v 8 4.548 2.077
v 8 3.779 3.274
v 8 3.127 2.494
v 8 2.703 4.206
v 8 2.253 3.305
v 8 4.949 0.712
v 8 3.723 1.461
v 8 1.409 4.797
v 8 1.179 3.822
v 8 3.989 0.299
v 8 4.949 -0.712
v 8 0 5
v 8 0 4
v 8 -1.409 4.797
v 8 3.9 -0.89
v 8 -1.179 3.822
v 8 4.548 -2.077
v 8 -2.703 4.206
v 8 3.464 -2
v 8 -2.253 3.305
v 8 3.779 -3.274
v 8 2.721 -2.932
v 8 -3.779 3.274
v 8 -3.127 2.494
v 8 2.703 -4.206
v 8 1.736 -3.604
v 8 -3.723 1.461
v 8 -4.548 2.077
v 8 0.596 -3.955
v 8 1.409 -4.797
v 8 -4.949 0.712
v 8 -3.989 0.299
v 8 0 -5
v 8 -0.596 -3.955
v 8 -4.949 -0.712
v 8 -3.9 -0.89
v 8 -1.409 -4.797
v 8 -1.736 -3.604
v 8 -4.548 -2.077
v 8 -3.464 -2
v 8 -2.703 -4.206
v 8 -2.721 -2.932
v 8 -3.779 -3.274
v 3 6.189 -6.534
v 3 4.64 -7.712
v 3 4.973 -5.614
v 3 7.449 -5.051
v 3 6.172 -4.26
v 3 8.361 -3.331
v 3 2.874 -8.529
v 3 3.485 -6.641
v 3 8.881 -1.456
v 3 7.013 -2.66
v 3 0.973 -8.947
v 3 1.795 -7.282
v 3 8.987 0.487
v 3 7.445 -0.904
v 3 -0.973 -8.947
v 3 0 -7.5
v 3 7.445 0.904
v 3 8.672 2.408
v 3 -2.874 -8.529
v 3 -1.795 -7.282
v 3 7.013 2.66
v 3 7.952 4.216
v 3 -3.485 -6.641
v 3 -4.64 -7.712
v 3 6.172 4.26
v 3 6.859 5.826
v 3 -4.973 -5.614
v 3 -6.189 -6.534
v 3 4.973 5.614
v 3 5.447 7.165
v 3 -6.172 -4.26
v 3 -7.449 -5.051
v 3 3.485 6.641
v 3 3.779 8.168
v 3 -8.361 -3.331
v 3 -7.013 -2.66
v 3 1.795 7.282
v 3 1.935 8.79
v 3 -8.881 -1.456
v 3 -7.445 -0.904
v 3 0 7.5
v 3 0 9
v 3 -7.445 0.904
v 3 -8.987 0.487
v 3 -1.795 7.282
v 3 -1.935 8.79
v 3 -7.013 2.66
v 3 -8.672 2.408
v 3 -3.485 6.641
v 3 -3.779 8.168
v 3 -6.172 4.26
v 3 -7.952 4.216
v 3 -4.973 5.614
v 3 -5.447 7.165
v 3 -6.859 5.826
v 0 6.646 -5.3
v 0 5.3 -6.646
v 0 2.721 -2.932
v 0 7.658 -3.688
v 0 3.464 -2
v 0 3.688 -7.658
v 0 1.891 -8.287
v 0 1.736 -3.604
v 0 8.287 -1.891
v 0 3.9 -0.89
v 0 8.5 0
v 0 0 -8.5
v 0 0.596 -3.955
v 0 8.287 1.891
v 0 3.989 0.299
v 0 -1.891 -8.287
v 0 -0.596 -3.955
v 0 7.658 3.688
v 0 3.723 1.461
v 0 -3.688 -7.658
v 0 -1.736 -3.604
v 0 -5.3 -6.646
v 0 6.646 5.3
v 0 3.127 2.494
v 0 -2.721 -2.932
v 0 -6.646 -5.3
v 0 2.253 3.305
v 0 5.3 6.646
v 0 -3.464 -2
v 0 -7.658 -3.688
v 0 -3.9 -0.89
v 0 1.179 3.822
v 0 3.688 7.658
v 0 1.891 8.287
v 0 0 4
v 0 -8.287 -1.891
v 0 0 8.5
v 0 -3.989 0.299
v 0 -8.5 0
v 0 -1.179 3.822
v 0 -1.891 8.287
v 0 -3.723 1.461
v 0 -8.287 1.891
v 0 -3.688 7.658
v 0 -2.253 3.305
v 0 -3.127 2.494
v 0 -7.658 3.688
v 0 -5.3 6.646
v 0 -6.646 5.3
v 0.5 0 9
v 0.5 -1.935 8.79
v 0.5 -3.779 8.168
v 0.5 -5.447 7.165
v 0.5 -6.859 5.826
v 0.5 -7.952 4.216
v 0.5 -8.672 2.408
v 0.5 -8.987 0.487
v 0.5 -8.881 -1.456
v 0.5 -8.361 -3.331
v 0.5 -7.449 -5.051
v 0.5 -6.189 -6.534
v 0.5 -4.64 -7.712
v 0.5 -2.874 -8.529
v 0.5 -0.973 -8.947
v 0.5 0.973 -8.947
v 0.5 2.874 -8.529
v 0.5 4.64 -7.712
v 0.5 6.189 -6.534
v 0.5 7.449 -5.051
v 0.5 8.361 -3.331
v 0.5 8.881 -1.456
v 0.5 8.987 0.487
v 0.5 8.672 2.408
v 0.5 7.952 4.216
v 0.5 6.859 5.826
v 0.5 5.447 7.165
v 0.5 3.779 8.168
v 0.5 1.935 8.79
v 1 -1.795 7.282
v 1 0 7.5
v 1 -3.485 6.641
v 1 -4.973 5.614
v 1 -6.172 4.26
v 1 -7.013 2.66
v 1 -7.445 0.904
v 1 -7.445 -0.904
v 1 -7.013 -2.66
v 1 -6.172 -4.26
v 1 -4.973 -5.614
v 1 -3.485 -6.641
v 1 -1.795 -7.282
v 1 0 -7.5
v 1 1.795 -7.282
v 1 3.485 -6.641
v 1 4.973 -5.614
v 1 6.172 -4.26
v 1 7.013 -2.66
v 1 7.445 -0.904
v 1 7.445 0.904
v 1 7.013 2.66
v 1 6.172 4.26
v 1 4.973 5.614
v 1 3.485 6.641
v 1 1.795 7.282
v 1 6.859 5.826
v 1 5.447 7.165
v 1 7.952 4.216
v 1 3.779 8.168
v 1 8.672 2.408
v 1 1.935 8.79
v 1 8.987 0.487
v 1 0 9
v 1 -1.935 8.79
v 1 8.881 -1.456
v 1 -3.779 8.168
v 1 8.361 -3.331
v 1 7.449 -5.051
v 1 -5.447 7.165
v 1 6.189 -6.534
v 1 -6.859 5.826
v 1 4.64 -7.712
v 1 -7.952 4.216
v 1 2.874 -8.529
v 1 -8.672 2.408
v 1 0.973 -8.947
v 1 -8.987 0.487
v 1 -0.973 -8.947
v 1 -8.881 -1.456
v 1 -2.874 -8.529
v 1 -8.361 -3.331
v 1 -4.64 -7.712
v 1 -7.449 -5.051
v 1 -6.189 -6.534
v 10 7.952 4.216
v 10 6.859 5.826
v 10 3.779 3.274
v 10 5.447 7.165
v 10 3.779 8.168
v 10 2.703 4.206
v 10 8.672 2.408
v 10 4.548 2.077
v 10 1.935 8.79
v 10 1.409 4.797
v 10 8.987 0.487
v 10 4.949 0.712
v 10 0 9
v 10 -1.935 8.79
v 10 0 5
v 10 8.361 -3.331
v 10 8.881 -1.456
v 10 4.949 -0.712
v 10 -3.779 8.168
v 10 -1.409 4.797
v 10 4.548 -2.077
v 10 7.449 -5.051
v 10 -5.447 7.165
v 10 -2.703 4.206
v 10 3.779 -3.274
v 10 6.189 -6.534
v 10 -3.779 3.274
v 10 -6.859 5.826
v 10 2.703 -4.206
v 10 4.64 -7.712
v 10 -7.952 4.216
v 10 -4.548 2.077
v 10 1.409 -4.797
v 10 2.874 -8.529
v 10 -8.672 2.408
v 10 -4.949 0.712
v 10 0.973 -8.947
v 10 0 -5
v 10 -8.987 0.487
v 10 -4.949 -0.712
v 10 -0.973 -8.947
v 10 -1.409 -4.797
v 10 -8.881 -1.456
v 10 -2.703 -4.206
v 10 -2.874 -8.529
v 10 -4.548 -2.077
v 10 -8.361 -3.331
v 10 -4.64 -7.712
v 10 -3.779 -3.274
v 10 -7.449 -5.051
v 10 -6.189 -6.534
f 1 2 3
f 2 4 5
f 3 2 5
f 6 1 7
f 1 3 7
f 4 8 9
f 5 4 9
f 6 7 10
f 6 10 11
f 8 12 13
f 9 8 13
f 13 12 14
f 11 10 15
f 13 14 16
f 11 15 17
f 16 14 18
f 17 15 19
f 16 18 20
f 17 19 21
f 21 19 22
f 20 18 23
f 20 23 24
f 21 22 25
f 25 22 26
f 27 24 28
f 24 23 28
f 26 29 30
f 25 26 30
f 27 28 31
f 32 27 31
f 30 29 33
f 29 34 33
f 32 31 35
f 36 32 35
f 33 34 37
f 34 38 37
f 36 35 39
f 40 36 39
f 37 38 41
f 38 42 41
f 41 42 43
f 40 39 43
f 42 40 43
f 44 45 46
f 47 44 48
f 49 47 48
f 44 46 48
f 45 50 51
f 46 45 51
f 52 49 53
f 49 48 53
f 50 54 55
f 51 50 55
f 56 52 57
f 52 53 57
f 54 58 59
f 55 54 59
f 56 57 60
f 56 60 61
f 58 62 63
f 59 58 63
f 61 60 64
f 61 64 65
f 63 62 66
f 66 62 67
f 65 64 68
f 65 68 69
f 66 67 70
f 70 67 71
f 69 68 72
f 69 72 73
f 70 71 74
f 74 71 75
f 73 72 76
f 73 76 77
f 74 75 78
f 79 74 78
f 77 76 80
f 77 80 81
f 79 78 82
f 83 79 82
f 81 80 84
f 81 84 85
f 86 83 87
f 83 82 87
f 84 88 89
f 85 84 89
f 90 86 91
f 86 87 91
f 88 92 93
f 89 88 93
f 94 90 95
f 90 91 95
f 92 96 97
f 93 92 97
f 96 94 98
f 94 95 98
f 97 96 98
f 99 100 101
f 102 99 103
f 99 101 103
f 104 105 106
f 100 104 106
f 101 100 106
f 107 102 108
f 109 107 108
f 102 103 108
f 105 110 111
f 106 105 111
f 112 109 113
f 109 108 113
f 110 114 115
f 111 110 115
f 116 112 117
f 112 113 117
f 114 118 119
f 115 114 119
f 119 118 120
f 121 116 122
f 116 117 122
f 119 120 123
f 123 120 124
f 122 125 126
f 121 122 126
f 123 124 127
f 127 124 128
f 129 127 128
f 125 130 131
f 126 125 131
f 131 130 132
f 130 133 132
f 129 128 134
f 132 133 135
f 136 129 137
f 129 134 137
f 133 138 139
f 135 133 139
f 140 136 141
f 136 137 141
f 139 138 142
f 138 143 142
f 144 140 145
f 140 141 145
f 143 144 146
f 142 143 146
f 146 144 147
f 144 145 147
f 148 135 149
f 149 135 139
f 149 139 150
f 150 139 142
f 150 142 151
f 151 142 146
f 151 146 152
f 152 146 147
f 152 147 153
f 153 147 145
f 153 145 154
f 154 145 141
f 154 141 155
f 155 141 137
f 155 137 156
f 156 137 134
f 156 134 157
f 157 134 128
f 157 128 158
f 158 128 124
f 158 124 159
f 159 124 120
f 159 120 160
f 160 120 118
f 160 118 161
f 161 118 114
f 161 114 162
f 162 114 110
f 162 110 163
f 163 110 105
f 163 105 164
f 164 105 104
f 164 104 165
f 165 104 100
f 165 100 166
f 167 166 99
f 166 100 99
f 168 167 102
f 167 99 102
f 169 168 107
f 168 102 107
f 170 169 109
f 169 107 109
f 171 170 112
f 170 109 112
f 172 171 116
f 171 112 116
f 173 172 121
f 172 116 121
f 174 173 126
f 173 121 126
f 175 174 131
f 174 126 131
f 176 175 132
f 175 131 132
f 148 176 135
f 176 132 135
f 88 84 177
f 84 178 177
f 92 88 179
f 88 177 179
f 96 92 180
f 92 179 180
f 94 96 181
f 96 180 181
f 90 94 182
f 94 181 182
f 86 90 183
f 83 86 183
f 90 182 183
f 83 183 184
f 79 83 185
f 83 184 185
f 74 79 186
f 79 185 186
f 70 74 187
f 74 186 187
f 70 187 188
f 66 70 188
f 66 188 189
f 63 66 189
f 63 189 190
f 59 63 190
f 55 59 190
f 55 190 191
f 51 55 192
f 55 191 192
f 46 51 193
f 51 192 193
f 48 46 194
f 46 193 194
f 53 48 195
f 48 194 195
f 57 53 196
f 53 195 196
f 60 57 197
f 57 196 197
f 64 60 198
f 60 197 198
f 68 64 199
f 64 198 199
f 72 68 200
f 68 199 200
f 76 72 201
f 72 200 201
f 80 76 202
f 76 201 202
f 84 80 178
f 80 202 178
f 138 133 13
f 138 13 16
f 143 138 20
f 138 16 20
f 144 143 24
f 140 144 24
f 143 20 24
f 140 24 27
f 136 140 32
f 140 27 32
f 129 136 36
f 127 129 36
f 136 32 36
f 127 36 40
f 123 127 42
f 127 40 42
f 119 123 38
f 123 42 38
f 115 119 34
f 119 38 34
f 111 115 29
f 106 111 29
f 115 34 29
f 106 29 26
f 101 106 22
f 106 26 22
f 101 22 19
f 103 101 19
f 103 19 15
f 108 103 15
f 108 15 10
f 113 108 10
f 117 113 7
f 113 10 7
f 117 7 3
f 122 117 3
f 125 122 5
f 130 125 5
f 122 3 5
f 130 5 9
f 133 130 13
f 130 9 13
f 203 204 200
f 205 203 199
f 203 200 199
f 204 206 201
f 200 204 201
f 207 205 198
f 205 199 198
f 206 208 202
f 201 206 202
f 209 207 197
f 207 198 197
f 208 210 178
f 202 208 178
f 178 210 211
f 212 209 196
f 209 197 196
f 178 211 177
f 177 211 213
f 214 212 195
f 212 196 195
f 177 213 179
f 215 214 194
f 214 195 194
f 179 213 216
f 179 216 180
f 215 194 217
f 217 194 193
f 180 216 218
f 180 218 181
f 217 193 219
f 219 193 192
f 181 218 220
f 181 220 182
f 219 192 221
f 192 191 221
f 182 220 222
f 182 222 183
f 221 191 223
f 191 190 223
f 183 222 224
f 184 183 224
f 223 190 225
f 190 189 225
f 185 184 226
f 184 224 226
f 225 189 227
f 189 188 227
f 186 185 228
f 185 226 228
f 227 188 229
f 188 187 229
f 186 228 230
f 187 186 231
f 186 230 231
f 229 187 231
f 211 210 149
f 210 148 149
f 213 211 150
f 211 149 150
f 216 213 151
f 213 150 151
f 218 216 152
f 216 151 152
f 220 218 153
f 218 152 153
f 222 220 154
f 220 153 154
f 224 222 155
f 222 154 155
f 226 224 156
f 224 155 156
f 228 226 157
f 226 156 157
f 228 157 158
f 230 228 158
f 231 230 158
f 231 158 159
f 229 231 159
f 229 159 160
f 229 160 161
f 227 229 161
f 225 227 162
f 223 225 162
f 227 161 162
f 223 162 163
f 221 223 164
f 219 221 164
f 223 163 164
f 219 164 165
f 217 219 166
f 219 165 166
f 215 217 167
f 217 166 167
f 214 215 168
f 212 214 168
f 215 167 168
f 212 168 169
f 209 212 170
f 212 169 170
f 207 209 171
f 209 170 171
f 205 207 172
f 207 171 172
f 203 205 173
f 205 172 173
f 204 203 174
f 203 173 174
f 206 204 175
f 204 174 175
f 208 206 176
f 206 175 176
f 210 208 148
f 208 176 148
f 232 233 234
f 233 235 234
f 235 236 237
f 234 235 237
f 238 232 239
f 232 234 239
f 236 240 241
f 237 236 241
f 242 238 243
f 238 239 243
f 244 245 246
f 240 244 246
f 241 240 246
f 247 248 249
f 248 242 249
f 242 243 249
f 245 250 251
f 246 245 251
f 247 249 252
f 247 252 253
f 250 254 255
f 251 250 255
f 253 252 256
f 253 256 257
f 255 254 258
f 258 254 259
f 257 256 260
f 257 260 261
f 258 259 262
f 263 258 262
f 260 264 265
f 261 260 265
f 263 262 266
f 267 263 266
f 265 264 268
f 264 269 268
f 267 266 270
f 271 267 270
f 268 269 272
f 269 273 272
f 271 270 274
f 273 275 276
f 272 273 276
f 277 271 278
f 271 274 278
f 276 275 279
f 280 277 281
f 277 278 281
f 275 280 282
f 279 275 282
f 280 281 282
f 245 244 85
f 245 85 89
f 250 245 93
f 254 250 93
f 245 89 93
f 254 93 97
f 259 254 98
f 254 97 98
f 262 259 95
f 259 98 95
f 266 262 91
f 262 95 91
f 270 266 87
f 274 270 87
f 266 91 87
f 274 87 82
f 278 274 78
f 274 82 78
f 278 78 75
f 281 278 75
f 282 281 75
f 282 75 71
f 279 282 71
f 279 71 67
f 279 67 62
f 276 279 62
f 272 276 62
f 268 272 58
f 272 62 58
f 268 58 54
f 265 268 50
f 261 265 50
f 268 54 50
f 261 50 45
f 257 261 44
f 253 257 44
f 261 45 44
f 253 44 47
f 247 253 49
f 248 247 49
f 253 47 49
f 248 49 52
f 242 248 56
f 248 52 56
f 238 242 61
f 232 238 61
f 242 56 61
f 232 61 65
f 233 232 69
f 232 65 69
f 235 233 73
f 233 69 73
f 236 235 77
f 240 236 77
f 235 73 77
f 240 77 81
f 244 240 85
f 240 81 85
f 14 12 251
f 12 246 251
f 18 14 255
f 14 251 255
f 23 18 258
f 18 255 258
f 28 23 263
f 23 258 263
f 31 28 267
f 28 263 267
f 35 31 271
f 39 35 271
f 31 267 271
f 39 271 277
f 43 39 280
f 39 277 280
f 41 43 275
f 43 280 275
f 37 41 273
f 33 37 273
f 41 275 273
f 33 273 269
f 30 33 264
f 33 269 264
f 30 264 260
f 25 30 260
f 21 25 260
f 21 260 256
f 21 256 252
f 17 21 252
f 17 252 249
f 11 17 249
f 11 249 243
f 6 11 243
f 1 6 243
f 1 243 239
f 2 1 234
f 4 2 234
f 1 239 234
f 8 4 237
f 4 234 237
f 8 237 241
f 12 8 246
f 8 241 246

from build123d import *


with BuildPart() as part:
    # Croquis1 → Revolución2 (revolve)
    with BuildSketch(Plane(origin=(0, 0, 0), x_dir=(1, 0, 0), z_dir=(0, 1, 0)), mode=Mode.PRIVATE) as revoluci_n2_sk:
        Polygon((0, 4), (8, 4), (8, 5), (10, 5), (10, 9), (3, 9), (3, 7.5), (1, 7.5), (1, 9), (0.5, 9), (0, 8.5), align=None)
    revolve(revoluci_n2_sk.sketch.rotate(Axis((0, 0, 0), (1, 0, 0)), 180), axis=Axis((0, 0, 0), (1, 0, 0)))


solid = part.part
